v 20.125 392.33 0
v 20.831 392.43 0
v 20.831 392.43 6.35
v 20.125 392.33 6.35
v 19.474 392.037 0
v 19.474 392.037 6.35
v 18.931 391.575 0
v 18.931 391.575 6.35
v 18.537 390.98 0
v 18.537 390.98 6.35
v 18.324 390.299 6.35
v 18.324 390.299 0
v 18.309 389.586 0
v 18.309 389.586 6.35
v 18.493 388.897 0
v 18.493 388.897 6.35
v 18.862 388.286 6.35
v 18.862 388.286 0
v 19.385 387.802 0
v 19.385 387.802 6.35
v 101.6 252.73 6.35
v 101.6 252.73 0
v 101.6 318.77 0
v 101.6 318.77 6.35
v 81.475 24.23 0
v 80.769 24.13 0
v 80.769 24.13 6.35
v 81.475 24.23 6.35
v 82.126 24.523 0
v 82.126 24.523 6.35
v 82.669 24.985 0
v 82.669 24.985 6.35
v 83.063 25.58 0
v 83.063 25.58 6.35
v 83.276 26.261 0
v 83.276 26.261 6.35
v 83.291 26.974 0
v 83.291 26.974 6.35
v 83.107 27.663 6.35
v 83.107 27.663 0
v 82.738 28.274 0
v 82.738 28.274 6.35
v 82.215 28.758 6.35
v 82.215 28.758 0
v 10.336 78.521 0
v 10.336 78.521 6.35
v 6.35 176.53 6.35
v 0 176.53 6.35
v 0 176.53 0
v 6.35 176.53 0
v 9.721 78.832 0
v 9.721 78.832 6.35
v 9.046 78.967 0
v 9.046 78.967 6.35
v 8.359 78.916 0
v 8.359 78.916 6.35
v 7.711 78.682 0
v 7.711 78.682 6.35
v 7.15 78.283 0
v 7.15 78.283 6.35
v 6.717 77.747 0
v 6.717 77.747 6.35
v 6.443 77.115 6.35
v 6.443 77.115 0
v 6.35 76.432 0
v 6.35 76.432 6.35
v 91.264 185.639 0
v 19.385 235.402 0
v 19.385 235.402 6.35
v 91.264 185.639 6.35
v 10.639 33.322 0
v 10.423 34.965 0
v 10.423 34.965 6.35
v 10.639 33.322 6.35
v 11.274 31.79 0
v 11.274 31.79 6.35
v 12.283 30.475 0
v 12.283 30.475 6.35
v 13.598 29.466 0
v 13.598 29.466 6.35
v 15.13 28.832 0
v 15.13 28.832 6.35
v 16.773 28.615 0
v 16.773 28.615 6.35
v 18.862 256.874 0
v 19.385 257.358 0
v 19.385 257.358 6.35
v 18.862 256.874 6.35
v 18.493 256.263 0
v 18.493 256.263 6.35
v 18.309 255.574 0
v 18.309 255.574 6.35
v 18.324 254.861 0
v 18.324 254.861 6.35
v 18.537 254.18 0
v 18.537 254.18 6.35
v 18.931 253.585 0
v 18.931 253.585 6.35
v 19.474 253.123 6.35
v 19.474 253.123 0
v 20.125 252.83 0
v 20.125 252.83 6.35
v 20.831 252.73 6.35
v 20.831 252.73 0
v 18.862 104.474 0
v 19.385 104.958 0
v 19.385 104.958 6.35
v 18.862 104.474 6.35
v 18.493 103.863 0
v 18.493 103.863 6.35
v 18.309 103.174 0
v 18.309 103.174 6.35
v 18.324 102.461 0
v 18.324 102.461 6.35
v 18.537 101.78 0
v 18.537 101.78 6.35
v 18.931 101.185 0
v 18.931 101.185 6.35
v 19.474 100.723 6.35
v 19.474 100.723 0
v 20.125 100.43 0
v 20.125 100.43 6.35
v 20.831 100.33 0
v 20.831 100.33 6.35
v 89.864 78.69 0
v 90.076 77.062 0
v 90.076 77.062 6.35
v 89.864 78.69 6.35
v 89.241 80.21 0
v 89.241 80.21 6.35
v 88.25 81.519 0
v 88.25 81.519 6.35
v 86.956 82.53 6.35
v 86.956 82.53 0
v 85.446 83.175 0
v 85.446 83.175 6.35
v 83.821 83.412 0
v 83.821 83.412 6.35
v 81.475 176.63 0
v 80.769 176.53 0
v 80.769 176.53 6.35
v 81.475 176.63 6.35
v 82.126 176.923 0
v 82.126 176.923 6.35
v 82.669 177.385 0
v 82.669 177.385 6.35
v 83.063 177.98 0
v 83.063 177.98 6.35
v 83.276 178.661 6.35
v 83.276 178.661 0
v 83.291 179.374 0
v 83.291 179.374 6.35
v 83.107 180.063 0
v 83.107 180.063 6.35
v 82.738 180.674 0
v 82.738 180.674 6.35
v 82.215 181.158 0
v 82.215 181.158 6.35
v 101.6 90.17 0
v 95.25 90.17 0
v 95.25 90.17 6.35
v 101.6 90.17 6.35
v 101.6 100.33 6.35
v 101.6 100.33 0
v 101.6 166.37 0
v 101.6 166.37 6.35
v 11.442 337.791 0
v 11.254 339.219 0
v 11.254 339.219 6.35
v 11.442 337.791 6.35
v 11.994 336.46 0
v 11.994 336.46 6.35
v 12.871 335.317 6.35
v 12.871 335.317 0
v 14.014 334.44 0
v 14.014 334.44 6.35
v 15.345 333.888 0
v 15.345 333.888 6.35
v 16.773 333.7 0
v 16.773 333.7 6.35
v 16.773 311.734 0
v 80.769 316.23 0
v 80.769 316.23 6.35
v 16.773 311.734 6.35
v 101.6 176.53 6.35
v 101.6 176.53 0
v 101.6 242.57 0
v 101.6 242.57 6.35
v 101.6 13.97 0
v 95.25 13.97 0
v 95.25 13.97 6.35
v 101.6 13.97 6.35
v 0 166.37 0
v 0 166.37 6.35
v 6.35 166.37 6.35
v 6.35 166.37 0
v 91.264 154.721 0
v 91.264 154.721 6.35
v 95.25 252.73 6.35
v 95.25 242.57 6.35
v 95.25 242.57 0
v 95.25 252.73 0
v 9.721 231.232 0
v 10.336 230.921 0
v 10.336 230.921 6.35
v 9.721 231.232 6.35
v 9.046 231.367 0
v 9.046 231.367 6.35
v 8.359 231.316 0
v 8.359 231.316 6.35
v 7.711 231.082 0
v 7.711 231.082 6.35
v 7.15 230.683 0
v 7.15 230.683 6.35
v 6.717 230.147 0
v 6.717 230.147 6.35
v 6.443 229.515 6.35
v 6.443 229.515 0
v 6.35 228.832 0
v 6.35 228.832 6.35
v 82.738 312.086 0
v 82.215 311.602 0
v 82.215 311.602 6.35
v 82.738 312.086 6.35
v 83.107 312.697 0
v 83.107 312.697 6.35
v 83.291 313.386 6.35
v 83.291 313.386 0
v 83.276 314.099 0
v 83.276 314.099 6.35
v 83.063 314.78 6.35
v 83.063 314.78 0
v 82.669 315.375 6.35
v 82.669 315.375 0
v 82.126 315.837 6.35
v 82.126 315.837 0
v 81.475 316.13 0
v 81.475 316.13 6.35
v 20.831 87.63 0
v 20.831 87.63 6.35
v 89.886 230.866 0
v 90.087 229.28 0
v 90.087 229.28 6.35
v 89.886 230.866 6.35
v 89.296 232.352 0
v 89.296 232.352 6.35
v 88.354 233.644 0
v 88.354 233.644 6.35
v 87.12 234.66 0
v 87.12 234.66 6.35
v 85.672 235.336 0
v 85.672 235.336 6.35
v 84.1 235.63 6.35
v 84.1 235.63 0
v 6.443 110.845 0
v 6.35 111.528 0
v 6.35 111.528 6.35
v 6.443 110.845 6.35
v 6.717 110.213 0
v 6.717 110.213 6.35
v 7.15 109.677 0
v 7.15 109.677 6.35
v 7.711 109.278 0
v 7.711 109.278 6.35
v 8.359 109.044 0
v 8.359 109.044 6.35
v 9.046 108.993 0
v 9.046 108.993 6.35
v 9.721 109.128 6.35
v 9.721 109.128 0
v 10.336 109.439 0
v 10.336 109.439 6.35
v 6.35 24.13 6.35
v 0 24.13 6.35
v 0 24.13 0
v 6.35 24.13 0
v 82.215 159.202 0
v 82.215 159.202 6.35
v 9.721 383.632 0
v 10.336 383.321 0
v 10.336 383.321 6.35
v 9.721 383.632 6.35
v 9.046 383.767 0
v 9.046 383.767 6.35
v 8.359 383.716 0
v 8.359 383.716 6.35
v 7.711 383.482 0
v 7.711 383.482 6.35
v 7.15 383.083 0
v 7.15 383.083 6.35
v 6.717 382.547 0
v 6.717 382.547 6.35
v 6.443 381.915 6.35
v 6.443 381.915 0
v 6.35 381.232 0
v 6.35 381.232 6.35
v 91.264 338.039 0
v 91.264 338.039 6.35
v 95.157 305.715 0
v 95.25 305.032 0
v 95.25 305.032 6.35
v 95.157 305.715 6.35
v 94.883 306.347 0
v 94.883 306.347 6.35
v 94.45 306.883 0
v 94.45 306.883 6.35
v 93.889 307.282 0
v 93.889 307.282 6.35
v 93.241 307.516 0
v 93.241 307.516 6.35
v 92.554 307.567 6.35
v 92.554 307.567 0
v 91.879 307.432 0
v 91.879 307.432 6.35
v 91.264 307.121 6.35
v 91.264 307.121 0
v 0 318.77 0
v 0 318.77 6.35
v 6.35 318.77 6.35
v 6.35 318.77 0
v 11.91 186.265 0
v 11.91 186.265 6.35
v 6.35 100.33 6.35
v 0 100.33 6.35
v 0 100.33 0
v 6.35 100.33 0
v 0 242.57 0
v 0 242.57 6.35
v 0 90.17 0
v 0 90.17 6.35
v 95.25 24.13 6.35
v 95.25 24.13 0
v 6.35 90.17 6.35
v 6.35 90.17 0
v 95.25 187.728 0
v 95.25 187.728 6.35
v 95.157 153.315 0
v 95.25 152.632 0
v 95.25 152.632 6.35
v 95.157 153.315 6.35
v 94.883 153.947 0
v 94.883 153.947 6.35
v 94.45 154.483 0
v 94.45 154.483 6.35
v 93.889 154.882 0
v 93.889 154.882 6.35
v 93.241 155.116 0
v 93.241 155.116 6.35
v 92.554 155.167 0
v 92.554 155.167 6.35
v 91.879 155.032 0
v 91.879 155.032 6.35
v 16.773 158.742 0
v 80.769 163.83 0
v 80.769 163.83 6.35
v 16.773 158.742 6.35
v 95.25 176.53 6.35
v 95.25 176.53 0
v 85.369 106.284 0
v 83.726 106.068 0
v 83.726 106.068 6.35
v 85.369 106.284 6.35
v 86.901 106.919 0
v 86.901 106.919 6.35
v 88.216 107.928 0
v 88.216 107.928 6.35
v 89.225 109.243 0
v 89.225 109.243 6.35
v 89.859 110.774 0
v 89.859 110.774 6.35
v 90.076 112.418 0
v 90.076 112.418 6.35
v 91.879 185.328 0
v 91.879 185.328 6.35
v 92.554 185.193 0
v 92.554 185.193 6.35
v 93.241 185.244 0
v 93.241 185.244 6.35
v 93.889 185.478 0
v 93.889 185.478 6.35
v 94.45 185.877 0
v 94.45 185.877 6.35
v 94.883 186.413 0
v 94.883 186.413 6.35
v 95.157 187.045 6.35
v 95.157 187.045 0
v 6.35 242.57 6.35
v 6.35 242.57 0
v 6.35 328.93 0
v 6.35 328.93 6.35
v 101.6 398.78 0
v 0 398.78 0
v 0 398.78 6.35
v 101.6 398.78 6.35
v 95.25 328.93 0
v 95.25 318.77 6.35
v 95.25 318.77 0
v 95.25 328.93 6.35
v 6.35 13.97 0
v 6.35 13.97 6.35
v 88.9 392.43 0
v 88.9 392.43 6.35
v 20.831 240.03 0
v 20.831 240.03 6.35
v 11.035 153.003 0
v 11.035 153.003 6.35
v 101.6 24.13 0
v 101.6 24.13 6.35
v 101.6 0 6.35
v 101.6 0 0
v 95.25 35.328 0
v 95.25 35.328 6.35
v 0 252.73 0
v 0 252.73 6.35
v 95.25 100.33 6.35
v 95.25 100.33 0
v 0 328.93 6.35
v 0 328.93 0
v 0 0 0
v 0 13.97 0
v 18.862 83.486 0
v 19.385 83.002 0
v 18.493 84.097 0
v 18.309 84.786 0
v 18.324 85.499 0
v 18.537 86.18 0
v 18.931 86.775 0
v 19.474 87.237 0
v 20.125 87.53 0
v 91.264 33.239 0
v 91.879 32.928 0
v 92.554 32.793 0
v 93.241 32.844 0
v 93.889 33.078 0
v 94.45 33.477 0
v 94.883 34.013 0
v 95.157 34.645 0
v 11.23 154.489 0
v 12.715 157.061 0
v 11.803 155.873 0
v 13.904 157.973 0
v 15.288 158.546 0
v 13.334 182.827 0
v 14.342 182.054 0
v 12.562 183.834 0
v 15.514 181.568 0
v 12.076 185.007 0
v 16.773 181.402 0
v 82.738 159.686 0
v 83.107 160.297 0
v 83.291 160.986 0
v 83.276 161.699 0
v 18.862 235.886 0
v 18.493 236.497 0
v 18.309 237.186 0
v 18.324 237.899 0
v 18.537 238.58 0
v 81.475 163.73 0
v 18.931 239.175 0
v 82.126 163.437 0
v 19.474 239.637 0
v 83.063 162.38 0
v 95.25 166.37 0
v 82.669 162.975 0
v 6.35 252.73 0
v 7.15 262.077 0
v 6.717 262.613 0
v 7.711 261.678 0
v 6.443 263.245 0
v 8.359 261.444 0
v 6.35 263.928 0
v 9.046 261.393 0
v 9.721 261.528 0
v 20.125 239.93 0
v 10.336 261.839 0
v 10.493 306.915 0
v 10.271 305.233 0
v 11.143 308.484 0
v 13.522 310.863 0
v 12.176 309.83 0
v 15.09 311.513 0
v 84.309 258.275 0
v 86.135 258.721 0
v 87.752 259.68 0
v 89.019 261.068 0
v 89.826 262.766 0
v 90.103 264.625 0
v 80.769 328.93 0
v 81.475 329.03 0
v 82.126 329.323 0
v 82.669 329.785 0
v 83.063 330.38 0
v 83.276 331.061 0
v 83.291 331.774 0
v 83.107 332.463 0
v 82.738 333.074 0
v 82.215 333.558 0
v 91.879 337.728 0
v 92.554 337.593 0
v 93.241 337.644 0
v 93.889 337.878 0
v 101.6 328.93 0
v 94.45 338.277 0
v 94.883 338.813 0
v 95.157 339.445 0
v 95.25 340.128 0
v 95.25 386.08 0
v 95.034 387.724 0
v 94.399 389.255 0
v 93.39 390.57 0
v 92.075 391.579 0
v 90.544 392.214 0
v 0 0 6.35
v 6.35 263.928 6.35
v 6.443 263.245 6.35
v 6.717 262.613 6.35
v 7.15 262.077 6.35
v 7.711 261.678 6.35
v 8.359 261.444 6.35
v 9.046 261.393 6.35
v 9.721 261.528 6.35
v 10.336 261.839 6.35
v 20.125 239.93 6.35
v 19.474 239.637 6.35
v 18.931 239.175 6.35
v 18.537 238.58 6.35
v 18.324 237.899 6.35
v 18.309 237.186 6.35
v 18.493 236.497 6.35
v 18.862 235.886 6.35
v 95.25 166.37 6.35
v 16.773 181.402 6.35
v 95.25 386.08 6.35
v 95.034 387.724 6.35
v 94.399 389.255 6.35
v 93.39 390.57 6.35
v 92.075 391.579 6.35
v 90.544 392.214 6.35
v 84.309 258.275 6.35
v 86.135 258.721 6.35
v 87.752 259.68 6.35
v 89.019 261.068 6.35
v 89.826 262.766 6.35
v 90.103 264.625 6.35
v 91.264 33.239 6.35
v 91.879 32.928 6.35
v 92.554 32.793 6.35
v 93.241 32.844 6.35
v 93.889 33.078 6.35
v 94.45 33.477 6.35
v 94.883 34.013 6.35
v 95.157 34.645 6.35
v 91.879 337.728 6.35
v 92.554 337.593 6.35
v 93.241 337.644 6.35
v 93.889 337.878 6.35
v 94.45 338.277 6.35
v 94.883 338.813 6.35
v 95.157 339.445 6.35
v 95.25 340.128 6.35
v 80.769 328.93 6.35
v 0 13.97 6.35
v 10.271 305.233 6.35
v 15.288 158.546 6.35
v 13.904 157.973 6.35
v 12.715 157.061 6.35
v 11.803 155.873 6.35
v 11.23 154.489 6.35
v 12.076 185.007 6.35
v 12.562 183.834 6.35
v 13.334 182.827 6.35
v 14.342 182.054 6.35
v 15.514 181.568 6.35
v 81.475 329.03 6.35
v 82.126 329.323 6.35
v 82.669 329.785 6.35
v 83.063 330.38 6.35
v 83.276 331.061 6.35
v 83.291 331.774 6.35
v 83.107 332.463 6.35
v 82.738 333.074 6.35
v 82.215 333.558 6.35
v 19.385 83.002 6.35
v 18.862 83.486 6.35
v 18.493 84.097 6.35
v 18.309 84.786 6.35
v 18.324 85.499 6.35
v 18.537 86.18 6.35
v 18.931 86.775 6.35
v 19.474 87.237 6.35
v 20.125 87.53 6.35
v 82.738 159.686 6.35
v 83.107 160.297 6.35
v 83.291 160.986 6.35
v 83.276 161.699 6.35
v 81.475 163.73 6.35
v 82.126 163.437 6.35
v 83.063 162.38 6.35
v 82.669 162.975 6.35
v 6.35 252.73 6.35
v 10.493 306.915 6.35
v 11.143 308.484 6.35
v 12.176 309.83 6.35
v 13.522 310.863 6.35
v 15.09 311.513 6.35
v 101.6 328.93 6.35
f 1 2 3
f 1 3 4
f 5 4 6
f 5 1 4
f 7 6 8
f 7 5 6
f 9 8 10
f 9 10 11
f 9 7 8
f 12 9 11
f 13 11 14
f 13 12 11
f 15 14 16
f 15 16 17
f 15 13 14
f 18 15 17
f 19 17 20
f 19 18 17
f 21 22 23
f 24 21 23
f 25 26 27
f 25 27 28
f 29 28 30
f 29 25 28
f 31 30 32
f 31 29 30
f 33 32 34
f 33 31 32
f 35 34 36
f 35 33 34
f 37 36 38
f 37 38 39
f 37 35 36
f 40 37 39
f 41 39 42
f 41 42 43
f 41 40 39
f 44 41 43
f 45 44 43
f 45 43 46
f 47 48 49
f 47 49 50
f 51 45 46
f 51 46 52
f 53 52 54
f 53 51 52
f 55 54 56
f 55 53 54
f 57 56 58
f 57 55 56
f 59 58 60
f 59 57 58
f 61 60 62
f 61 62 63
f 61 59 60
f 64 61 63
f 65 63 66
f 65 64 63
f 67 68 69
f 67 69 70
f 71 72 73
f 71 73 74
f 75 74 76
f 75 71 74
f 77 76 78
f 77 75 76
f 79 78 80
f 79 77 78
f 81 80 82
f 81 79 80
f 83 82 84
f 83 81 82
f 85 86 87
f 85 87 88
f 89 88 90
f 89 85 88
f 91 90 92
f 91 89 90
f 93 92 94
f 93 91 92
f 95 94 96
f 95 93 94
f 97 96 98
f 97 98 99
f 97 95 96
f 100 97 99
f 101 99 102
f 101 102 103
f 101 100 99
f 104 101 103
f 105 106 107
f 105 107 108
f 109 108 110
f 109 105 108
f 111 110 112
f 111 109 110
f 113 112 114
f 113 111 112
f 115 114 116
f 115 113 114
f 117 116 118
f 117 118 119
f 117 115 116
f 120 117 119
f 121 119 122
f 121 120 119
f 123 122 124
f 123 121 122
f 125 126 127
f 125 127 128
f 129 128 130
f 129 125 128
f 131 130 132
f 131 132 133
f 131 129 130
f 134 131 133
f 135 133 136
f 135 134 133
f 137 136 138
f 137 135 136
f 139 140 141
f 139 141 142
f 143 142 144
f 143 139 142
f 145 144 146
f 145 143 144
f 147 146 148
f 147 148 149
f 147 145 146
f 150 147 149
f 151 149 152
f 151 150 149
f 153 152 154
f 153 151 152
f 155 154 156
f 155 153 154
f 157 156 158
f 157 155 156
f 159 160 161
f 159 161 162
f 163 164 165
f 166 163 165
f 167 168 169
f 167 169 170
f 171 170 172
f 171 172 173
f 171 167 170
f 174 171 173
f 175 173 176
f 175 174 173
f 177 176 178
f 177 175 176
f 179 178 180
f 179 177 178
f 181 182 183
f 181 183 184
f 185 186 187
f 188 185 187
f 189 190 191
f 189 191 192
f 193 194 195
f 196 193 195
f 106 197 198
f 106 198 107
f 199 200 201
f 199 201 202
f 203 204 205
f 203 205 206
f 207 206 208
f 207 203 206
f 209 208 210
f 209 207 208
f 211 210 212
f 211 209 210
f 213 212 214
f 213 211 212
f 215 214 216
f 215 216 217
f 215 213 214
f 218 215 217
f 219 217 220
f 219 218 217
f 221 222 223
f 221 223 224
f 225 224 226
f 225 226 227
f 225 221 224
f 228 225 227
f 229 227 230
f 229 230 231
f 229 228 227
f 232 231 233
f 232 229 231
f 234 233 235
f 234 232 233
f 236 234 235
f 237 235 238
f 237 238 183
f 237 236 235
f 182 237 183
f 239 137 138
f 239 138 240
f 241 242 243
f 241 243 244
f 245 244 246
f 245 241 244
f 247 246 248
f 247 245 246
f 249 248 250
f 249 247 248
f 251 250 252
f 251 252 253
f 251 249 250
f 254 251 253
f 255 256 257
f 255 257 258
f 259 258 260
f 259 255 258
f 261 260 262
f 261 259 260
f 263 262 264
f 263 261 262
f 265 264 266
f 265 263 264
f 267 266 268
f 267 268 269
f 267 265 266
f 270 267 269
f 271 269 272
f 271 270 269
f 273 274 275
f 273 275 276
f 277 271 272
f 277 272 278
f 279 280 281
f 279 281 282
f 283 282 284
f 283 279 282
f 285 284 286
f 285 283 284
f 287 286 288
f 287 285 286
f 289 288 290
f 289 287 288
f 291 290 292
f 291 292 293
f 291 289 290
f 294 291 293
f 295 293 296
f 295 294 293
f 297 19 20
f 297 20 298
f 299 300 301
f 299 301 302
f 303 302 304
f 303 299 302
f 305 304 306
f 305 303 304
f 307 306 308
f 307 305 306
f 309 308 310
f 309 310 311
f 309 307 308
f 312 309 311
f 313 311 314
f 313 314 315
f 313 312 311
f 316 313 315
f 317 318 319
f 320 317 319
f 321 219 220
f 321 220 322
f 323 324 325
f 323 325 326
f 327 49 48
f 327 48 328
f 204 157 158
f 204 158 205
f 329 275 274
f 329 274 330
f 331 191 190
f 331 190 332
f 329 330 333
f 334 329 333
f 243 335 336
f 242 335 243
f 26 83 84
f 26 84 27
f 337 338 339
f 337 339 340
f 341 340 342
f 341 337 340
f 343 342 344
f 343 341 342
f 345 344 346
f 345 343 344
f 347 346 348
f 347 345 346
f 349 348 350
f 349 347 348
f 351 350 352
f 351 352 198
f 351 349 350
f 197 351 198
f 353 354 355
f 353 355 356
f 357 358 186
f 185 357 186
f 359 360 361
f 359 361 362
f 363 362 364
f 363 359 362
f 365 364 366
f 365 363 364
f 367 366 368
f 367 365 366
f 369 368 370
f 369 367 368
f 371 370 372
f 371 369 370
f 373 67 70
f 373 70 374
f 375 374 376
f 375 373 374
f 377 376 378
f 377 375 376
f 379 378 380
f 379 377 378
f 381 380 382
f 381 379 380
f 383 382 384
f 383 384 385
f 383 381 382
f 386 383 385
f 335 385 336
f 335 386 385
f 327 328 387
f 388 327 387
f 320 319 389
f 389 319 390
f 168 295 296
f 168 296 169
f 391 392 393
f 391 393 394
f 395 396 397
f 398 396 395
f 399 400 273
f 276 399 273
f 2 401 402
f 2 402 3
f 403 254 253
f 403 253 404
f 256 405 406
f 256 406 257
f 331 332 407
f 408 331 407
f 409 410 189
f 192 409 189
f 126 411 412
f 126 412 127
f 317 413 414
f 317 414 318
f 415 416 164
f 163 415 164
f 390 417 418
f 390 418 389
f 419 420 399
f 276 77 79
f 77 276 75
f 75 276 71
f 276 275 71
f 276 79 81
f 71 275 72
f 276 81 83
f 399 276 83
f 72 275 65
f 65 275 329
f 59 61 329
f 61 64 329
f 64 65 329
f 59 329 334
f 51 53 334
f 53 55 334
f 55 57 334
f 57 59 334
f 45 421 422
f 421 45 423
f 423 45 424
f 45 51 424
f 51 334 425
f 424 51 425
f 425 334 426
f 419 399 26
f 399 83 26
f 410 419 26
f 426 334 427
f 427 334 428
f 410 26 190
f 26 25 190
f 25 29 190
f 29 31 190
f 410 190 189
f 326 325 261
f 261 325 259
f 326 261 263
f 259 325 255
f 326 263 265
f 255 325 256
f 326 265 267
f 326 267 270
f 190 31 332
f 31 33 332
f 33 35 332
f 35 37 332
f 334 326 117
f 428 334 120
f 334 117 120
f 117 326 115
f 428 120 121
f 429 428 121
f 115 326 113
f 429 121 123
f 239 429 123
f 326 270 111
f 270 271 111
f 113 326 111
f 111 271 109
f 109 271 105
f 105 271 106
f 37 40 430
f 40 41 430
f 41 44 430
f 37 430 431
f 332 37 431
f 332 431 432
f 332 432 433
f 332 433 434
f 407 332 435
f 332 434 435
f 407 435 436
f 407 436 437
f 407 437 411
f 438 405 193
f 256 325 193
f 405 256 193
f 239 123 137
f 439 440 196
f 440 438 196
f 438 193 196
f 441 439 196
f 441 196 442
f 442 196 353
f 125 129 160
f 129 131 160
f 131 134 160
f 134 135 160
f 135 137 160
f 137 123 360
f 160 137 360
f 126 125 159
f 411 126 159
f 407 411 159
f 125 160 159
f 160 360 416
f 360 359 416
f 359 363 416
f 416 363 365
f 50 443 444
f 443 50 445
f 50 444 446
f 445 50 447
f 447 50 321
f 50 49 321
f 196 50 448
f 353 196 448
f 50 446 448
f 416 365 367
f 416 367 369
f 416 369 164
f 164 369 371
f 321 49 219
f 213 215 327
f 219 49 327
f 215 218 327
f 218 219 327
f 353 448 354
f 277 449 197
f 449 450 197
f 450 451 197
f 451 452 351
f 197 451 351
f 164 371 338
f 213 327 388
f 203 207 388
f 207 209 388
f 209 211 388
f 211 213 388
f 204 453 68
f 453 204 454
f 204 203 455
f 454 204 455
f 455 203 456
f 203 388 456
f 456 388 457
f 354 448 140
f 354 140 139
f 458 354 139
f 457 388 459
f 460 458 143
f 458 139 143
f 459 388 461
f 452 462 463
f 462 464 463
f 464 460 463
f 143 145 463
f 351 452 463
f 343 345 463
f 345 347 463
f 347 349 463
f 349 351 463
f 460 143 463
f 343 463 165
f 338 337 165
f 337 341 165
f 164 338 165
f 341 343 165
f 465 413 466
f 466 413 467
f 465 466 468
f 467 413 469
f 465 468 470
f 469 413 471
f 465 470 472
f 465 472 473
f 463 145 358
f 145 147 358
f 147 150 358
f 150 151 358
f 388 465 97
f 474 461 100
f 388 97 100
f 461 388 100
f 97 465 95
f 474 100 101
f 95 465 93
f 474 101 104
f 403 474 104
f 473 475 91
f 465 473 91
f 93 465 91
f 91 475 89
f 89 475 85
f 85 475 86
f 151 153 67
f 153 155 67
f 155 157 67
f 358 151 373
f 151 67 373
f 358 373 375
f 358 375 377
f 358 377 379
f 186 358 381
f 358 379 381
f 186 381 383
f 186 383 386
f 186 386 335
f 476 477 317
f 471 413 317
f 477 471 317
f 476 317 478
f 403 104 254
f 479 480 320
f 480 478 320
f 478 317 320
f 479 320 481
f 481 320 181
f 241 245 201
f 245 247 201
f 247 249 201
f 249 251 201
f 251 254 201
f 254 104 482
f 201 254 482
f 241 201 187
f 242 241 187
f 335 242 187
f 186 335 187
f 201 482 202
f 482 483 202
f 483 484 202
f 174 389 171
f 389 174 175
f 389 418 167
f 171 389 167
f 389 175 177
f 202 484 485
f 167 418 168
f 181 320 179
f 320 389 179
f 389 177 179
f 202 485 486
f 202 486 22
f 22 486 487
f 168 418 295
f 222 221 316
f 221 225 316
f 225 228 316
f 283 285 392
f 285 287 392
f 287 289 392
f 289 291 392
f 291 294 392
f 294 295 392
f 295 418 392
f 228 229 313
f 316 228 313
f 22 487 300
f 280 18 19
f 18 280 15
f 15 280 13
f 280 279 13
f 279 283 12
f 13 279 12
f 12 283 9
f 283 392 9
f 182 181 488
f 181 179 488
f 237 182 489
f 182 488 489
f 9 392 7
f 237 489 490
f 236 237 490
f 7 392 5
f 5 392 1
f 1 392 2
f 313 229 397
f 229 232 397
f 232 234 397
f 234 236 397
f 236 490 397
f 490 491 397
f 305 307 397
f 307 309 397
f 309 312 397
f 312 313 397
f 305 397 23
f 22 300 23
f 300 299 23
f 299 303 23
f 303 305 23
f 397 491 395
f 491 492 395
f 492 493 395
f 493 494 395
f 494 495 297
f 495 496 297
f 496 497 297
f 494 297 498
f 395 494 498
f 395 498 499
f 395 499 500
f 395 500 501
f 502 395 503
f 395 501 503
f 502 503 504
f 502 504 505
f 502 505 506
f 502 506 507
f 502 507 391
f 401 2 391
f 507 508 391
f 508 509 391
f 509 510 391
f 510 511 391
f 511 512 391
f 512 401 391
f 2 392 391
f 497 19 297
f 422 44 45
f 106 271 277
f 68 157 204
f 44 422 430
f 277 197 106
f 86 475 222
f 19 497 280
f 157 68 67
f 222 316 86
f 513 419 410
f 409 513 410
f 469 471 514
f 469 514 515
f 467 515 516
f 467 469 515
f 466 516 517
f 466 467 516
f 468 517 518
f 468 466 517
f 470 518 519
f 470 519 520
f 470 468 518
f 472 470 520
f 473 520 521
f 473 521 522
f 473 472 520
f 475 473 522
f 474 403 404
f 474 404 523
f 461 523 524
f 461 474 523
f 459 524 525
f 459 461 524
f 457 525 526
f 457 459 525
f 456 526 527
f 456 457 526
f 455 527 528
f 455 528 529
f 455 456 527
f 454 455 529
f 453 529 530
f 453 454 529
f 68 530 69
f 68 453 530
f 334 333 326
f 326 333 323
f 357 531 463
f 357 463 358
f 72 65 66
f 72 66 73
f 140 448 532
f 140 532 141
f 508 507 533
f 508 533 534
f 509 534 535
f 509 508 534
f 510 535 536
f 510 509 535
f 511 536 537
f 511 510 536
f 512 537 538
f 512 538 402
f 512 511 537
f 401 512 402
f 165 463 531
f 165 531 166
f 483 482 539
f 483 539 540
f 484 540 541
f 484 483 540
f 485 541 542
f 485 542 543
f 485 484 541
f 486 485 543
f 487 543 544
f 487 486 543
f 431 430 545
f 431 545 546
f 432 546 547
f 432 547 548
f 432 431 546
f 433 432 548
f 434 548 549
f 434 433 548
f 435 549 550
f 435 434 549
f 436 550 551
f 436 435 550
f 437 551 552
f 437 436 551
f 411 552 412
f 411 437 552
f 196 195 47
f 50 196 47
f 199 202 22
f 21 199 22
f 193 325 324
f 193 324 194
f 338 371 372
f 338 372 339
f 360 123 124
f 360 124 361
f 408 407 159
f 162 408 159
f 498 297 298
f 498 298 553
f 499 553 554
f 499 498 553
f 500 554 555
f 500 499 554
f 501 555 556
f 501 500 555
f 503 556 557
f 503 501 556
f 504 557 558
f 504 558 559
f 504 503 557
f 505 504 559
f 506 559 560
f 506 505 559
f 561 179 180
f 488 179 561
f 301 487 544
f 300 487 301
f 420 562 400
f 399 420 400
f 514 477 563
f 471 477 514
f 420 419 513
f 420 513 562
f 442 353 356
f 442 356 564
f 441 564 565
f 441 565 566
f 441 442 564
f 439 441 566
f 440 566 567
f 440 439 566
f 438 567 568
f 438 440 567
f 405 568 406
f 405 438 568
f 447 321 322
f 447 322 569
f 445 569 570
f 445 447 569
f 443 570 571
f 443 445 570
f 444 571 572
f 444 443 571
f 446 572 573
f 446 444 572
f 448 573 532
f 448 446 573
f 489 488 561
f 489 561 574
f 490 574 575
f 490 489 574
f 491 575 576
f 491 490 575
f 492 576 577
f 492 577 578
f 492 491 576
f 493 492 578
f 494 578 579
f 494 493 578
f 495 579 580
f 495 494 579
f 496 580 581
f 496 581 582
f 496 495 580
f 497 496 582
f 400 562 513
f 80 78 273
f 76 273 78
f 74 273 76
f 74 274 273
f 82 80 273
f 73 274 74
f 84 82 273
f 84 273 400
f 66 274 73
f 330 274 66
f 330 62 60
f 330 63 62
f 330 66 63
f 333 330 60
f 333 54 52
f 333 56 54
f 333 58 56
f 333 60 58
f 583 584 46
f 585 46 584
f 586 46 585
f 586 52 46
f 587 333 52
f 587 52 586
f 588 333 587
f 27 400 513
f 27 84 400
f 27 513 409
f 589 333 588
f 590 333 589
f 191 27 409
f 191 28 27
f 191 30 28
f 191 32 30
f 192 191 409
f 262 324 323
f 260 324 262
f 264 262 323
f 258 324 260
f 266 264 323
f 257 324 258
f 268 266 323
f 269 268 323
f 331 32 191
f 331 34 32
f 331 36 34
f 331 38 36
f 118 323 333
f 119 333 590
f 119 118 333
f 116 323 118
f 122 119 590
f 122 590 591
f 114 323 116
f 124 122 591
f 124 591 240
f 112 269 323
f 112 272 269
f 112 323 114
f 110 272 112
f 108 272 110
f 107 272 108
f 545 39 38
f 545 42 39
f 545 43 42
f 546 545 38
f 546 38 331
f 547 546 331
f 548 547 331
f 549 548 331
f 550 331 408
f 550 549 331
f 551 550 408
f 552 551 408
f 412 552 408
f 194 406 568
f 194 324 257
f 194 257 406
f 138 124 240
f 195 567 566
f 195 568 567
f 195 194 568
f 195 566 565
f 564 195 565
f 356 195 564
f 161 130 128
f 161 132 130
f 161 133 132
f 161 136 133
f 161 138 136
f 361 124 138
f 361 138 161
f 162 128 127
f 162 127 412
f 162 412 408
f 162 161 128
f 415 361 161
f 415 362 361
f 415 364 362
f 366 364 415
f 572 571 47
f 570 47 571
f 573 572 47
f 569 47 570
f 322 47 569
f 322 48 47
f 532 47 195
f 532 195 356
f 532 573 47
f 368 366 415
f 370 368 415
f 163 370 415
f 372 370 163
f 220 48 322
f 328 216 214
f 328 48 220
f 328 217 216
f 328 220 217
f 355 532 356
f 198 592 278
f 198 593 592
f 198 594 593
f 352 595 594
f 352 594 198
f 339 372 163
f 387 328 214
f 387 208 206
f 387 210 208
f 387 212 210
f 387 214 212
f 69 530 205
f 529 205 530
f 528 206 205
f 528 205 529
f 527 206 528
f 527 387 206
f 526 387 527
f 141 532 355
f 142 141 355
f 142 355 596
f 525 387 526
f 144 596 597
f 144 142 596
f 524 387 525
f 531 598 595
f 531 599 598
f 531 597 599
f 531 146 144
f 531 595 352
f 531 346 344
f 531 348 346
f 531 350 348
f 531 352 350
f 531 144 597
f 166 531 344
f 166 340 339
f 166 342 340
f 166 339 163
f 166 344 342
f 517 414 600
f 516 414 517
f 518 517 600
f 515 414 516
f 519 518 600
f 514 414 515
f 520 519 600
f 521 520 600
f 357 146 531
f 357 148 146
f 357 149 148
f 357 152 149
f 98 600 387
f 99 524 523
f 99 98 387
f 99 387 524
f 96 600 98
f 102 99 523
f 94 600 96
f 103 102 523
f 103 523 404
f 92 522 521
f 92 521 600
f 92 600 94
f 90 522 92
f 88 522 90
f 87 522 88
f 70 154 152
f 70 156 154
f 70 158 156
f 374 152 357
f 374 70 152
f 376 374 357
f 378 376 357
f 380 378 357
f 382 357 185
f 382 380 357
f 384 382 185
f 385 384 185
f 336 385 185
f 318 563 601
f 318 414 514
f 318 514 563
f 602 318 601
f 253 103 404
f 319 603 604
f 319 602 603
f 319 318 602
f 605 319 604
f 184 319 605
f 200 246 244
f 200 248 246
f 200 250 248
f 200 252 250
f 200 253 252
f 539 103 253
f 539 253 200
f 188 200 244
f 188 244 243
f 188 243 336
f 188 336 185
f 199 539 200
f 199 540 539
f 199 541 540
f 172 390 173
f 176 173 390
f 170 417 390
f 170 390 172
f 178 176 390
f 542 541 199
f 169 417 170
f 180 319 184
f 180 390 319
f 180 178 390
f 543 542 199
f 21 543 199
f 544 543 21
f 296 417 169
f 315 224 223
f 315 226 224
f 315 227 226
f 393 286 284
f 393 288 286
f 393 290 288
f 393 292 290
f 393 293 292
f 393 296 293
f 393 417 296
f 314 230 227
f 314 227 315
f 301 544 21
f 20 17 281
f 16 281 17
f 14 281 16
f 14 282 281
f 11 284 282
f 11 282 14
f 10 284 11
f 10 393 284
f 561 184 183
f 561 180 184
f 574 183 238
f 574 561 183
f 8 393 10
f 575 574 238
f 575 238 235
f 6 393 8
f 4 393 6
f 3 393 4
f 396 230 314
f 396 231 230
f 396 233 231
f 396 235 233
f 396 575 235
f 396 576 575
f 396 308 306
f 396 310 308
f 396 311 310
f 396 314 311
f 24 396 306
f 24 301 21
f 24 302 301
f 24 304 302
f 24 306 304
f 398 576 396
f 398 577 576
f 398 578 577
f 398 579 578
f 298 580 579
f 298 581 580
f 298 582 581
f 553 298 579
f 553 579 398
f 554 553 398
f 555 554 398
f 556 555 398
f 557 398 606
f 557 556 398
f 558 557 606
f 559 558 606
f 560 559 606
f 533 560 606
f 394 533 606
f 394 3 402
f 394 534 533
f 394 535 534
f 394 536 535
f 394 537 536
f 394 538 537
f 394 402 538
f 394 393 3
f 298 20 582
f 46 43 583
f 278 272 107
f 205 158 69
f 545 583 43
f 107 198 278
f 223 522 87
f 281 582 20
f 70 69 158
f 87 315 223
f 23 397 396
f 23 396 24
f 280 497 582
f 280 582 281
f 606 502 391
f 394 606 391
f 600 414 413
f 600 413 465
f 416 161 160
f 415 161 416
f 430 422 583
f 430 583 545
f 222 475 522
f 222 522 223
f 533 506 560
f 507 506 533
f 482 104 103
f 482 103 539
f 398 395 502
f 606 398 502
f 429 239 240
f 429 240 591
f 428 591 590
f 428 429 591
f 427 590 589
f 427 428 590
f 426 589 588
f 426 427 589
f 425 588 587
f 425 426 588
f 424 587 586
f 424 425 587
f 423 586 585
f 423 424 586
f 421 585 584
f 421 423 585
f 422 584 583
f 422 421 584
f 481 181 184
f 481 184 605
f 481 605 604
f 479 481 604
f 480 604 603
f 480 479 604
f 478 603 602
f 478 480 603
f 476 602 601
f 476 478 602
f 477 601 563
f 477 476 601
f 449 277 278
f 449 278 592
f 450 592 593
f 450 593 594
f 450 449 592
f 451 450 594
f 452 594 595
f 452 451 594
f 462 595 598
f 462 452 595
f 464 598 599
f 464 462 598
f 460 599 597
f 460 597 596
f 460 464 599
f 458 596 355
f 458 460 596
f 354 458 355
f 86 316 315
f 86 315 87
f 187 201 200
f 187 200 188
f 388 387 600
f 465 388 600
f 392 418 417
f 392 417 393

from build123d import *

# Parameters (mm, degrees)
MODEL_W             = 101.6
MODEL_H             = 398.78
BOSS_EXTRUDE1_DEPTH = 6.35
SKETCH1_W           = 6.35
SKETCH1_H           = 10.16
CUT_EXTRUDE1_DEPTH  = 6.35


with BuildPart() as part:
    # Model → Boss-Extrude1 (new body)
    with BuildSketch(Plane.XY):
        with Locations((50.8, 199.39)):
            Rectangle(MODEL_W, MODEL_H)
        with BuildLine():
            Line((83.820574672, 83.411866713), (20.83121403, 87.63))
            ThreePointArc((20.83121403, 87.63), (18.406749642, 85.847345646), (19.385420684, 83.001631833))
            Line((19.385420684, 83.001631833), (91.264206654, 33.239395393))
            ThreePointArc((91.264206654, 33.239395393), (93.888830968, 33.077884107), (95.25, 35.32776356))
            Line((95.25, 35.32776356), (90.076491123, 77.061866713))
            ThreePointArc((90.076491123, 77.061866713), (88.249801524, 81.518855344), (83.820574672, 83.411866713))
        make_face(mode=Mode.SUBTRACT)
        with BuildLine():
            Line((11.034694705, 153.003483907), (6.35, 111.52776356))
            ThreePointArc((6.35, 111.52776356), (7.711169032, 109.277884107), (10.335793346, 109.439395393))
            Line((10.335793346, 109.439395393), (82.214579316, 159.201631833))
            ThreePointArc((82.214579316, 159.201631833), (83.193250358, 162.047345646), (80.76878597, 163.83))
            Line((80.76878597, 163.83), (16.773036865, 158.741826067))
            ThreePointArc((16.773036865, 158.741826067), (12.715416211, 157.061104561), (11.034694705, 153.003483907))
        make_face(mode=Mode.SUBTRACT)
        with BuildLine():
            Line((84.100188096, 235.630146894), (20.83121403, 240.03))
            ThreePointArc((20.83121403, 240.03), (18.406749642, 238.247345646), (19.385420684, 235.401631833))
            Line((19.385420684, 235.401631833), (91.264206654, 185.639395393))
            ThreePointArc((91.264206654, 185.639395393), (93.888830968, 185.477884107), (95.25, 187.72776356))
            Line((95.25, 187.72776356), (90.086811771, 229.280146894))
            ThreePointArc((90.086811771, 229.280146894), (88.354189205, 233.643693703), (84.100188096, 235.630146894))
        make_face(mode=Mode.SUBTRACT)
        with BuildLine():
            Line((16.773036865, 181.402479512), (80.76878597, 176.53))
            ThreePointArc((80.76878597, 176.53), (83.193250358, 178.312654354), (82.214579316, 181.158368167))
            Line((82.214579316, 181.158368167), (10.335793346, 230.920604607))
            ThreePointArc((10.335793346, 230.920604607), (7.711169032, 231.082115893), (6.35, 228.83223644))
            Line((6.35, 228.83223644), (11.910018955, 186.265497422))
            ThreePointArc((11.910018955, 186.265497422), (13.334363923, 182.826824481), (16.773036865, 181.402479512))
        make_face(mode=Mode.SUBTRACT)
        with BuildLine():
            Line((91.264206654, 154.720604607), (19.385420684, 104.958368167))
            ThreePointArc((19.385420684, 104.958368167), (18.406749642, 102.112654354), (20.83121403, 100.33))
            Line((20.83121403, 100.33), (83.725783656, 106.06798896))
            ThreePointArc((83.725783656, 106.06798896), (88.215911716, 107.9278609), (90.075783656, 112.41798896))
            Line((90.075783656, 112.41798896), (95.25, 152.63223644))
            ThreePointArc((95.25, 152.63223644), (93.888830968, 154.882115893), (91.264206654, 154.720604607))
        make_face(mode=Mode.SUBTRACT)
        with BuildLine():
            Line((10.271454318, 305.232761919), (6.35, 263.92776356))
            ThreePointArc((6.35, 263.92776356), (7.711169032, 261.677884107), (10.335793346, 261.839395393))
            Line((10.335793346, 261.839395393), (82.214579316, 311.601631833))
            ThreePointArc((82.214579316, 311.601631833), (83.193250358, 314.447345646), (80.76878597, 316.23))
            Line((80.76878597, 316.23), (16.773036865, 311.734344465))
            ThreePointArc((16.773036865, 311.734344465), (12.175723757, 309.830075026), (10.271454318, 305.232761919))
        make_face(mode=Mode.SUBTRACT)
        with BuildLine():
            Line((88.9, 392.43), (20.83121403, 392.43))
            ThreePointArc((20.83121403, 392.43), (18.406749642, 390.647345646), (19.385420684, 387.801631833))
            Line((19.385420684, 387.801631833), (91.264206654, 338.039395393))
            ThreePointArc((91.264206654, 338.039395393), (93.888830968, 337.877884107), (95.25, 340.12776356))
            Line((95.25, 340.12776356), (95.25, 386.08))
            ThreePointArc((95.25, 386.08), (93.390128061, 390.570128061), (88.9, 392.43))
        make_face(mode=Mode.SUBTRACT)
        with BuildLine():
            Line((16.773036865, 333.700240414), (80.76878597, 328.93))
            ThreePointArc((80.76878597, 328.93), (83.193250358, 330.712654354), (82.214579316, 333.558368167))
            Line((82.214579316, 333.558368167), (10.335793346, 383.320604607))
            ThreePointArc((10.335793346, 383.320604607), (7.711169032, 383.482115893), (6.35, 381.23223644))
            Line((6.35, 381.23223644), (11.254237586, 339.219039692))
            ThreePointArc((11.254237586, 339.219039692), (12.870656471, 335.316659298), (16.773036865, 333.700240414))
        make_face(mode=Mode.SUBTRACT)
        with BuildLine():
            Line((16.773036865, 28.615297102), (80.76878597, 24.13))
            ThreePointArc((80.76878597, 24.13), (83.193250358, 25.912654354), (82.214579316, 28.758368167))
            Line((82.214579316, 28.758368167), (10.335793346, 78.520604607))
            ThreePointArc((10.335793346, 78.520604607), (7.711169032, 78.682115893), (6.35, 76.43223644))
            Line((6.35, 76.43223644), (10.423036865, 34.965297102))
            ThreePointArc((10.423036865, 34.965297102), (12.282908804, 30.475169041), (16.773036865, 28.615297102))
        make_face(mode=Mode.SUBTRACT)
        with BuildLine():
            Line((91.264206654, 307.120604607), (19.385420684, 257.358368167))
            ThreePointArc((19.385420684, 257.358368167), (18.406749642, 254.512654354), (20.83121403, 252.73))
            Line((20.83121403, 252.73), (84.309327563, 258.27471682))
            ThreePointArc((84.309327563, 258.27471682), (88.4366297, 260.326932153), (90.102540158, 264.62471682))
            Line((90.102540158, 264.62471682), (95.25, 305.03223644))
            ThreePointArc((95.25, 305.03223644), (93.888830968, 307.282115893), (91.264206654, 307.120604607))
        make_face(mode=Mode.SUBTRACT)
    extrude(amount=BOSS_EXTRUDE1_DEPTH)

    # Sketch1 → Cut-Extrude1 (cut)
    with BuildSketch(Plane.XY.offset(6.35)):
        with Locations((98.425, 19.05)):
            Rectangle(SKETCH1_W, SKETCH1_H)
        with Locations((3.175, 95.25)):
            Rectangle(SKETCH1_W, SKETCH1_H)
        with Locations((98.425, 171.45)):
            Rectangle(SKETCH1_W, SKETCH1_H)
        with Locations((3.175, 171.45)):
            Rectangle(SKETCH1_W, SKETCH1_H)
        with Locations((98.425, 247.65)):
            Rectangle(SKETCH1_W, SKETCH1_H)
        with Locations((3.175, 323.85)):
            Rectangle(SKETCH1_W, SKETCH1_H)
        with Locations((3.175, 19.05)):
            Rectangle(SKETCH1_W, SKETCH1_H)
        with Locations((98.425, 95.25)):
            Rectangle(SKETCH1_W, SKETCH1_H)
        with Locations((3.175, 247.65)):
            Rectangle(SKETCH1_W, SKETCH1_H)
        with Locations((98.425, 323.85)):
            Rectangle(SKETCH1_W, SKETCH1_H)
    extrude(amount=-CUT_EXTRUDE1_DEPTH, mode=Mode.SUBTRACT)


solid = part.part
